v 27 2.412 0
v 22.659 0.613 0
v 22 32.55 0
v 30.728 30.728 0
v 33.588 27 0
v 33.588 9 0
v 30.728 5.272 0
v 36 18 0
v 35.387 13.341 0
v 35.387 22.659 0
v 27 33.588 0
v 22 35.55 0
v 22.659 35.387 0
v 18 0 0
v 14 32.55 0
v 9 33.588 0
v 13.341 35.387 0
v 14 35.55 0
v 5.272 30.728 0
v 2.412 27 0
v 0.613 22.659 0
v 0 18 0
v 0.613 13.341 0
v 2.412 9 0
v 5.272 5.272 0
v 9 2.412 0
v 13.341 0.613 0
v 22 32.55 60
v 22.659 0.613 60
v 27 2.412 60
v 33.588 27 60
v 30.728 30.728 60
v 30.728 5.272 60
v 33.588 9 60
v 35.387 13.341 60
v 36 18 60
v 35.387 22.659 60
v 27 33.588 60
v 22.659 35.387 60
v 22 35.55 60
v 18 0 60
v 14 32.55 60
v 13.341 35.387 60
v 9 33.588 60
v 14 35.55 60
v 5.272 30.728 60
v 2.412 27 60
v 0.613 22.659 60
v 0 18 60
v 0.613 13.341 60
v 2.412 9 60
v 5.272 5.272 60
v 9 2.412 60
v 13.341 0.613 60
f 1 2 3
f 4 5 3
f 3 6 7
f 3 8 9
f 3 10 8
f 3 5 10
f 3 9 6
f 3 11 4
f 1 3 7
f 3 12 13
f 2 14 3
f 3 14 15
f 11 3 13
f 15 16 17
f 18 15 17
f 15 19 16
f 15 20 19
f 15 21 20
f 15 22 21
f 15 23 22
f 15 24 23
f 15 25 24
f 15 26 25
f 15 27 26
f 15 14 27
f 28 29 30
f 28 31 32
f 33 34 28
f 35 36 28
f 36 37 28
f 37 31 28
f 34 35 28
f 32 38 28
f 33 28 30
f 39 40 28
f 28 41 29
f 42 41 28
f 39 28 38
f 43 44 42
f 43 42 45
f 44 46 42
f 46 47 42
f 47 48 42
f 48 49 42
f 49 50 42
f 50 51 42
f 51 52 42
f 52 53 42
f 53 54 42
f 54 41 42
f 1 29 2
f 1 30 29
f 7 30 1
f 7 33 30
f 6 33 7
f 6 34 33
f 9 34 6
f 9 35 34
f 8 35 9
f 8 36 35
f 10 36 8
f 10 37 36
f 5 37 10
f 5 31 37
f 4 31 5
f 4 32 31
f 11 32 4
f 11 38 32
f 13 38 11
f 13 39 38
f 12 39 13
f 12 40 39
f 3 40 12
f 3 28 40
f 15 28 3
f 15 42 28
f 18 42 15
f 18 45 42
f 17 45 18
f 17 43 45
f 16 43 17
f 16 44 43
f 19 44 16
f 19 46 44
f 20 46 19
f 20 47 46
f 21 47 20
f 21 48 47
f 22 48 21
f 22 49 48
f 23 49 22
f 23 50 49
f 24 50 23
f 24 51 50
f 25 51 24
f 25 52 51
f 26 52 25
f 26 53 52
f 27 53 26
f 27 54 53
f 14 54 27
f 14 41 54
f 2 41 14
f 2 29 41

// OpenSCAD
$fn = 32;

// ----------------------------------------------------------------------
// Keyway shaft: d36 shaft, key 8 x 3 mm
// ----------------------------------------------------------------------

// --- parameters (mm) ---
shaft_r = 18;             // shaft radius
key_w = 8;                // keyway width
key_d = 3;                // keyway depth below the surface line
plate_t = 60;             // shaft length, Z (extrusion height)

shaft_d = 2 * shaft_r;  // shaft diameter
circle_step = 15;  // polygon sampling step, degrees

profile = [[13.341, 35.387], [9, 33.588], [5.272, 30.728], [2.412, 27], [0.613, 22.659], [0, 18], [0.613, 13.341], [2.412, 9], [5.272, 5.272], [9, 2.412], [13.341, 0.613], [18, 0], [22.659, 0.613], [27, 2.412], [30.728, 5.272], [33.588, 9], [35.387, 13.341], [36, 18], [35.387, 22.659], [33.588, 27], [30.728, 30.728], [27, 33.588], [22.659, 35.387], [22, 35.55], [22, 32.55], [14, 32.55], [14, 35.55]];  // primary outline, 27 points, counter clockwise

// --- the one profile operation ---
linear_extrude(height = plate_t) polygon(points = profile);
